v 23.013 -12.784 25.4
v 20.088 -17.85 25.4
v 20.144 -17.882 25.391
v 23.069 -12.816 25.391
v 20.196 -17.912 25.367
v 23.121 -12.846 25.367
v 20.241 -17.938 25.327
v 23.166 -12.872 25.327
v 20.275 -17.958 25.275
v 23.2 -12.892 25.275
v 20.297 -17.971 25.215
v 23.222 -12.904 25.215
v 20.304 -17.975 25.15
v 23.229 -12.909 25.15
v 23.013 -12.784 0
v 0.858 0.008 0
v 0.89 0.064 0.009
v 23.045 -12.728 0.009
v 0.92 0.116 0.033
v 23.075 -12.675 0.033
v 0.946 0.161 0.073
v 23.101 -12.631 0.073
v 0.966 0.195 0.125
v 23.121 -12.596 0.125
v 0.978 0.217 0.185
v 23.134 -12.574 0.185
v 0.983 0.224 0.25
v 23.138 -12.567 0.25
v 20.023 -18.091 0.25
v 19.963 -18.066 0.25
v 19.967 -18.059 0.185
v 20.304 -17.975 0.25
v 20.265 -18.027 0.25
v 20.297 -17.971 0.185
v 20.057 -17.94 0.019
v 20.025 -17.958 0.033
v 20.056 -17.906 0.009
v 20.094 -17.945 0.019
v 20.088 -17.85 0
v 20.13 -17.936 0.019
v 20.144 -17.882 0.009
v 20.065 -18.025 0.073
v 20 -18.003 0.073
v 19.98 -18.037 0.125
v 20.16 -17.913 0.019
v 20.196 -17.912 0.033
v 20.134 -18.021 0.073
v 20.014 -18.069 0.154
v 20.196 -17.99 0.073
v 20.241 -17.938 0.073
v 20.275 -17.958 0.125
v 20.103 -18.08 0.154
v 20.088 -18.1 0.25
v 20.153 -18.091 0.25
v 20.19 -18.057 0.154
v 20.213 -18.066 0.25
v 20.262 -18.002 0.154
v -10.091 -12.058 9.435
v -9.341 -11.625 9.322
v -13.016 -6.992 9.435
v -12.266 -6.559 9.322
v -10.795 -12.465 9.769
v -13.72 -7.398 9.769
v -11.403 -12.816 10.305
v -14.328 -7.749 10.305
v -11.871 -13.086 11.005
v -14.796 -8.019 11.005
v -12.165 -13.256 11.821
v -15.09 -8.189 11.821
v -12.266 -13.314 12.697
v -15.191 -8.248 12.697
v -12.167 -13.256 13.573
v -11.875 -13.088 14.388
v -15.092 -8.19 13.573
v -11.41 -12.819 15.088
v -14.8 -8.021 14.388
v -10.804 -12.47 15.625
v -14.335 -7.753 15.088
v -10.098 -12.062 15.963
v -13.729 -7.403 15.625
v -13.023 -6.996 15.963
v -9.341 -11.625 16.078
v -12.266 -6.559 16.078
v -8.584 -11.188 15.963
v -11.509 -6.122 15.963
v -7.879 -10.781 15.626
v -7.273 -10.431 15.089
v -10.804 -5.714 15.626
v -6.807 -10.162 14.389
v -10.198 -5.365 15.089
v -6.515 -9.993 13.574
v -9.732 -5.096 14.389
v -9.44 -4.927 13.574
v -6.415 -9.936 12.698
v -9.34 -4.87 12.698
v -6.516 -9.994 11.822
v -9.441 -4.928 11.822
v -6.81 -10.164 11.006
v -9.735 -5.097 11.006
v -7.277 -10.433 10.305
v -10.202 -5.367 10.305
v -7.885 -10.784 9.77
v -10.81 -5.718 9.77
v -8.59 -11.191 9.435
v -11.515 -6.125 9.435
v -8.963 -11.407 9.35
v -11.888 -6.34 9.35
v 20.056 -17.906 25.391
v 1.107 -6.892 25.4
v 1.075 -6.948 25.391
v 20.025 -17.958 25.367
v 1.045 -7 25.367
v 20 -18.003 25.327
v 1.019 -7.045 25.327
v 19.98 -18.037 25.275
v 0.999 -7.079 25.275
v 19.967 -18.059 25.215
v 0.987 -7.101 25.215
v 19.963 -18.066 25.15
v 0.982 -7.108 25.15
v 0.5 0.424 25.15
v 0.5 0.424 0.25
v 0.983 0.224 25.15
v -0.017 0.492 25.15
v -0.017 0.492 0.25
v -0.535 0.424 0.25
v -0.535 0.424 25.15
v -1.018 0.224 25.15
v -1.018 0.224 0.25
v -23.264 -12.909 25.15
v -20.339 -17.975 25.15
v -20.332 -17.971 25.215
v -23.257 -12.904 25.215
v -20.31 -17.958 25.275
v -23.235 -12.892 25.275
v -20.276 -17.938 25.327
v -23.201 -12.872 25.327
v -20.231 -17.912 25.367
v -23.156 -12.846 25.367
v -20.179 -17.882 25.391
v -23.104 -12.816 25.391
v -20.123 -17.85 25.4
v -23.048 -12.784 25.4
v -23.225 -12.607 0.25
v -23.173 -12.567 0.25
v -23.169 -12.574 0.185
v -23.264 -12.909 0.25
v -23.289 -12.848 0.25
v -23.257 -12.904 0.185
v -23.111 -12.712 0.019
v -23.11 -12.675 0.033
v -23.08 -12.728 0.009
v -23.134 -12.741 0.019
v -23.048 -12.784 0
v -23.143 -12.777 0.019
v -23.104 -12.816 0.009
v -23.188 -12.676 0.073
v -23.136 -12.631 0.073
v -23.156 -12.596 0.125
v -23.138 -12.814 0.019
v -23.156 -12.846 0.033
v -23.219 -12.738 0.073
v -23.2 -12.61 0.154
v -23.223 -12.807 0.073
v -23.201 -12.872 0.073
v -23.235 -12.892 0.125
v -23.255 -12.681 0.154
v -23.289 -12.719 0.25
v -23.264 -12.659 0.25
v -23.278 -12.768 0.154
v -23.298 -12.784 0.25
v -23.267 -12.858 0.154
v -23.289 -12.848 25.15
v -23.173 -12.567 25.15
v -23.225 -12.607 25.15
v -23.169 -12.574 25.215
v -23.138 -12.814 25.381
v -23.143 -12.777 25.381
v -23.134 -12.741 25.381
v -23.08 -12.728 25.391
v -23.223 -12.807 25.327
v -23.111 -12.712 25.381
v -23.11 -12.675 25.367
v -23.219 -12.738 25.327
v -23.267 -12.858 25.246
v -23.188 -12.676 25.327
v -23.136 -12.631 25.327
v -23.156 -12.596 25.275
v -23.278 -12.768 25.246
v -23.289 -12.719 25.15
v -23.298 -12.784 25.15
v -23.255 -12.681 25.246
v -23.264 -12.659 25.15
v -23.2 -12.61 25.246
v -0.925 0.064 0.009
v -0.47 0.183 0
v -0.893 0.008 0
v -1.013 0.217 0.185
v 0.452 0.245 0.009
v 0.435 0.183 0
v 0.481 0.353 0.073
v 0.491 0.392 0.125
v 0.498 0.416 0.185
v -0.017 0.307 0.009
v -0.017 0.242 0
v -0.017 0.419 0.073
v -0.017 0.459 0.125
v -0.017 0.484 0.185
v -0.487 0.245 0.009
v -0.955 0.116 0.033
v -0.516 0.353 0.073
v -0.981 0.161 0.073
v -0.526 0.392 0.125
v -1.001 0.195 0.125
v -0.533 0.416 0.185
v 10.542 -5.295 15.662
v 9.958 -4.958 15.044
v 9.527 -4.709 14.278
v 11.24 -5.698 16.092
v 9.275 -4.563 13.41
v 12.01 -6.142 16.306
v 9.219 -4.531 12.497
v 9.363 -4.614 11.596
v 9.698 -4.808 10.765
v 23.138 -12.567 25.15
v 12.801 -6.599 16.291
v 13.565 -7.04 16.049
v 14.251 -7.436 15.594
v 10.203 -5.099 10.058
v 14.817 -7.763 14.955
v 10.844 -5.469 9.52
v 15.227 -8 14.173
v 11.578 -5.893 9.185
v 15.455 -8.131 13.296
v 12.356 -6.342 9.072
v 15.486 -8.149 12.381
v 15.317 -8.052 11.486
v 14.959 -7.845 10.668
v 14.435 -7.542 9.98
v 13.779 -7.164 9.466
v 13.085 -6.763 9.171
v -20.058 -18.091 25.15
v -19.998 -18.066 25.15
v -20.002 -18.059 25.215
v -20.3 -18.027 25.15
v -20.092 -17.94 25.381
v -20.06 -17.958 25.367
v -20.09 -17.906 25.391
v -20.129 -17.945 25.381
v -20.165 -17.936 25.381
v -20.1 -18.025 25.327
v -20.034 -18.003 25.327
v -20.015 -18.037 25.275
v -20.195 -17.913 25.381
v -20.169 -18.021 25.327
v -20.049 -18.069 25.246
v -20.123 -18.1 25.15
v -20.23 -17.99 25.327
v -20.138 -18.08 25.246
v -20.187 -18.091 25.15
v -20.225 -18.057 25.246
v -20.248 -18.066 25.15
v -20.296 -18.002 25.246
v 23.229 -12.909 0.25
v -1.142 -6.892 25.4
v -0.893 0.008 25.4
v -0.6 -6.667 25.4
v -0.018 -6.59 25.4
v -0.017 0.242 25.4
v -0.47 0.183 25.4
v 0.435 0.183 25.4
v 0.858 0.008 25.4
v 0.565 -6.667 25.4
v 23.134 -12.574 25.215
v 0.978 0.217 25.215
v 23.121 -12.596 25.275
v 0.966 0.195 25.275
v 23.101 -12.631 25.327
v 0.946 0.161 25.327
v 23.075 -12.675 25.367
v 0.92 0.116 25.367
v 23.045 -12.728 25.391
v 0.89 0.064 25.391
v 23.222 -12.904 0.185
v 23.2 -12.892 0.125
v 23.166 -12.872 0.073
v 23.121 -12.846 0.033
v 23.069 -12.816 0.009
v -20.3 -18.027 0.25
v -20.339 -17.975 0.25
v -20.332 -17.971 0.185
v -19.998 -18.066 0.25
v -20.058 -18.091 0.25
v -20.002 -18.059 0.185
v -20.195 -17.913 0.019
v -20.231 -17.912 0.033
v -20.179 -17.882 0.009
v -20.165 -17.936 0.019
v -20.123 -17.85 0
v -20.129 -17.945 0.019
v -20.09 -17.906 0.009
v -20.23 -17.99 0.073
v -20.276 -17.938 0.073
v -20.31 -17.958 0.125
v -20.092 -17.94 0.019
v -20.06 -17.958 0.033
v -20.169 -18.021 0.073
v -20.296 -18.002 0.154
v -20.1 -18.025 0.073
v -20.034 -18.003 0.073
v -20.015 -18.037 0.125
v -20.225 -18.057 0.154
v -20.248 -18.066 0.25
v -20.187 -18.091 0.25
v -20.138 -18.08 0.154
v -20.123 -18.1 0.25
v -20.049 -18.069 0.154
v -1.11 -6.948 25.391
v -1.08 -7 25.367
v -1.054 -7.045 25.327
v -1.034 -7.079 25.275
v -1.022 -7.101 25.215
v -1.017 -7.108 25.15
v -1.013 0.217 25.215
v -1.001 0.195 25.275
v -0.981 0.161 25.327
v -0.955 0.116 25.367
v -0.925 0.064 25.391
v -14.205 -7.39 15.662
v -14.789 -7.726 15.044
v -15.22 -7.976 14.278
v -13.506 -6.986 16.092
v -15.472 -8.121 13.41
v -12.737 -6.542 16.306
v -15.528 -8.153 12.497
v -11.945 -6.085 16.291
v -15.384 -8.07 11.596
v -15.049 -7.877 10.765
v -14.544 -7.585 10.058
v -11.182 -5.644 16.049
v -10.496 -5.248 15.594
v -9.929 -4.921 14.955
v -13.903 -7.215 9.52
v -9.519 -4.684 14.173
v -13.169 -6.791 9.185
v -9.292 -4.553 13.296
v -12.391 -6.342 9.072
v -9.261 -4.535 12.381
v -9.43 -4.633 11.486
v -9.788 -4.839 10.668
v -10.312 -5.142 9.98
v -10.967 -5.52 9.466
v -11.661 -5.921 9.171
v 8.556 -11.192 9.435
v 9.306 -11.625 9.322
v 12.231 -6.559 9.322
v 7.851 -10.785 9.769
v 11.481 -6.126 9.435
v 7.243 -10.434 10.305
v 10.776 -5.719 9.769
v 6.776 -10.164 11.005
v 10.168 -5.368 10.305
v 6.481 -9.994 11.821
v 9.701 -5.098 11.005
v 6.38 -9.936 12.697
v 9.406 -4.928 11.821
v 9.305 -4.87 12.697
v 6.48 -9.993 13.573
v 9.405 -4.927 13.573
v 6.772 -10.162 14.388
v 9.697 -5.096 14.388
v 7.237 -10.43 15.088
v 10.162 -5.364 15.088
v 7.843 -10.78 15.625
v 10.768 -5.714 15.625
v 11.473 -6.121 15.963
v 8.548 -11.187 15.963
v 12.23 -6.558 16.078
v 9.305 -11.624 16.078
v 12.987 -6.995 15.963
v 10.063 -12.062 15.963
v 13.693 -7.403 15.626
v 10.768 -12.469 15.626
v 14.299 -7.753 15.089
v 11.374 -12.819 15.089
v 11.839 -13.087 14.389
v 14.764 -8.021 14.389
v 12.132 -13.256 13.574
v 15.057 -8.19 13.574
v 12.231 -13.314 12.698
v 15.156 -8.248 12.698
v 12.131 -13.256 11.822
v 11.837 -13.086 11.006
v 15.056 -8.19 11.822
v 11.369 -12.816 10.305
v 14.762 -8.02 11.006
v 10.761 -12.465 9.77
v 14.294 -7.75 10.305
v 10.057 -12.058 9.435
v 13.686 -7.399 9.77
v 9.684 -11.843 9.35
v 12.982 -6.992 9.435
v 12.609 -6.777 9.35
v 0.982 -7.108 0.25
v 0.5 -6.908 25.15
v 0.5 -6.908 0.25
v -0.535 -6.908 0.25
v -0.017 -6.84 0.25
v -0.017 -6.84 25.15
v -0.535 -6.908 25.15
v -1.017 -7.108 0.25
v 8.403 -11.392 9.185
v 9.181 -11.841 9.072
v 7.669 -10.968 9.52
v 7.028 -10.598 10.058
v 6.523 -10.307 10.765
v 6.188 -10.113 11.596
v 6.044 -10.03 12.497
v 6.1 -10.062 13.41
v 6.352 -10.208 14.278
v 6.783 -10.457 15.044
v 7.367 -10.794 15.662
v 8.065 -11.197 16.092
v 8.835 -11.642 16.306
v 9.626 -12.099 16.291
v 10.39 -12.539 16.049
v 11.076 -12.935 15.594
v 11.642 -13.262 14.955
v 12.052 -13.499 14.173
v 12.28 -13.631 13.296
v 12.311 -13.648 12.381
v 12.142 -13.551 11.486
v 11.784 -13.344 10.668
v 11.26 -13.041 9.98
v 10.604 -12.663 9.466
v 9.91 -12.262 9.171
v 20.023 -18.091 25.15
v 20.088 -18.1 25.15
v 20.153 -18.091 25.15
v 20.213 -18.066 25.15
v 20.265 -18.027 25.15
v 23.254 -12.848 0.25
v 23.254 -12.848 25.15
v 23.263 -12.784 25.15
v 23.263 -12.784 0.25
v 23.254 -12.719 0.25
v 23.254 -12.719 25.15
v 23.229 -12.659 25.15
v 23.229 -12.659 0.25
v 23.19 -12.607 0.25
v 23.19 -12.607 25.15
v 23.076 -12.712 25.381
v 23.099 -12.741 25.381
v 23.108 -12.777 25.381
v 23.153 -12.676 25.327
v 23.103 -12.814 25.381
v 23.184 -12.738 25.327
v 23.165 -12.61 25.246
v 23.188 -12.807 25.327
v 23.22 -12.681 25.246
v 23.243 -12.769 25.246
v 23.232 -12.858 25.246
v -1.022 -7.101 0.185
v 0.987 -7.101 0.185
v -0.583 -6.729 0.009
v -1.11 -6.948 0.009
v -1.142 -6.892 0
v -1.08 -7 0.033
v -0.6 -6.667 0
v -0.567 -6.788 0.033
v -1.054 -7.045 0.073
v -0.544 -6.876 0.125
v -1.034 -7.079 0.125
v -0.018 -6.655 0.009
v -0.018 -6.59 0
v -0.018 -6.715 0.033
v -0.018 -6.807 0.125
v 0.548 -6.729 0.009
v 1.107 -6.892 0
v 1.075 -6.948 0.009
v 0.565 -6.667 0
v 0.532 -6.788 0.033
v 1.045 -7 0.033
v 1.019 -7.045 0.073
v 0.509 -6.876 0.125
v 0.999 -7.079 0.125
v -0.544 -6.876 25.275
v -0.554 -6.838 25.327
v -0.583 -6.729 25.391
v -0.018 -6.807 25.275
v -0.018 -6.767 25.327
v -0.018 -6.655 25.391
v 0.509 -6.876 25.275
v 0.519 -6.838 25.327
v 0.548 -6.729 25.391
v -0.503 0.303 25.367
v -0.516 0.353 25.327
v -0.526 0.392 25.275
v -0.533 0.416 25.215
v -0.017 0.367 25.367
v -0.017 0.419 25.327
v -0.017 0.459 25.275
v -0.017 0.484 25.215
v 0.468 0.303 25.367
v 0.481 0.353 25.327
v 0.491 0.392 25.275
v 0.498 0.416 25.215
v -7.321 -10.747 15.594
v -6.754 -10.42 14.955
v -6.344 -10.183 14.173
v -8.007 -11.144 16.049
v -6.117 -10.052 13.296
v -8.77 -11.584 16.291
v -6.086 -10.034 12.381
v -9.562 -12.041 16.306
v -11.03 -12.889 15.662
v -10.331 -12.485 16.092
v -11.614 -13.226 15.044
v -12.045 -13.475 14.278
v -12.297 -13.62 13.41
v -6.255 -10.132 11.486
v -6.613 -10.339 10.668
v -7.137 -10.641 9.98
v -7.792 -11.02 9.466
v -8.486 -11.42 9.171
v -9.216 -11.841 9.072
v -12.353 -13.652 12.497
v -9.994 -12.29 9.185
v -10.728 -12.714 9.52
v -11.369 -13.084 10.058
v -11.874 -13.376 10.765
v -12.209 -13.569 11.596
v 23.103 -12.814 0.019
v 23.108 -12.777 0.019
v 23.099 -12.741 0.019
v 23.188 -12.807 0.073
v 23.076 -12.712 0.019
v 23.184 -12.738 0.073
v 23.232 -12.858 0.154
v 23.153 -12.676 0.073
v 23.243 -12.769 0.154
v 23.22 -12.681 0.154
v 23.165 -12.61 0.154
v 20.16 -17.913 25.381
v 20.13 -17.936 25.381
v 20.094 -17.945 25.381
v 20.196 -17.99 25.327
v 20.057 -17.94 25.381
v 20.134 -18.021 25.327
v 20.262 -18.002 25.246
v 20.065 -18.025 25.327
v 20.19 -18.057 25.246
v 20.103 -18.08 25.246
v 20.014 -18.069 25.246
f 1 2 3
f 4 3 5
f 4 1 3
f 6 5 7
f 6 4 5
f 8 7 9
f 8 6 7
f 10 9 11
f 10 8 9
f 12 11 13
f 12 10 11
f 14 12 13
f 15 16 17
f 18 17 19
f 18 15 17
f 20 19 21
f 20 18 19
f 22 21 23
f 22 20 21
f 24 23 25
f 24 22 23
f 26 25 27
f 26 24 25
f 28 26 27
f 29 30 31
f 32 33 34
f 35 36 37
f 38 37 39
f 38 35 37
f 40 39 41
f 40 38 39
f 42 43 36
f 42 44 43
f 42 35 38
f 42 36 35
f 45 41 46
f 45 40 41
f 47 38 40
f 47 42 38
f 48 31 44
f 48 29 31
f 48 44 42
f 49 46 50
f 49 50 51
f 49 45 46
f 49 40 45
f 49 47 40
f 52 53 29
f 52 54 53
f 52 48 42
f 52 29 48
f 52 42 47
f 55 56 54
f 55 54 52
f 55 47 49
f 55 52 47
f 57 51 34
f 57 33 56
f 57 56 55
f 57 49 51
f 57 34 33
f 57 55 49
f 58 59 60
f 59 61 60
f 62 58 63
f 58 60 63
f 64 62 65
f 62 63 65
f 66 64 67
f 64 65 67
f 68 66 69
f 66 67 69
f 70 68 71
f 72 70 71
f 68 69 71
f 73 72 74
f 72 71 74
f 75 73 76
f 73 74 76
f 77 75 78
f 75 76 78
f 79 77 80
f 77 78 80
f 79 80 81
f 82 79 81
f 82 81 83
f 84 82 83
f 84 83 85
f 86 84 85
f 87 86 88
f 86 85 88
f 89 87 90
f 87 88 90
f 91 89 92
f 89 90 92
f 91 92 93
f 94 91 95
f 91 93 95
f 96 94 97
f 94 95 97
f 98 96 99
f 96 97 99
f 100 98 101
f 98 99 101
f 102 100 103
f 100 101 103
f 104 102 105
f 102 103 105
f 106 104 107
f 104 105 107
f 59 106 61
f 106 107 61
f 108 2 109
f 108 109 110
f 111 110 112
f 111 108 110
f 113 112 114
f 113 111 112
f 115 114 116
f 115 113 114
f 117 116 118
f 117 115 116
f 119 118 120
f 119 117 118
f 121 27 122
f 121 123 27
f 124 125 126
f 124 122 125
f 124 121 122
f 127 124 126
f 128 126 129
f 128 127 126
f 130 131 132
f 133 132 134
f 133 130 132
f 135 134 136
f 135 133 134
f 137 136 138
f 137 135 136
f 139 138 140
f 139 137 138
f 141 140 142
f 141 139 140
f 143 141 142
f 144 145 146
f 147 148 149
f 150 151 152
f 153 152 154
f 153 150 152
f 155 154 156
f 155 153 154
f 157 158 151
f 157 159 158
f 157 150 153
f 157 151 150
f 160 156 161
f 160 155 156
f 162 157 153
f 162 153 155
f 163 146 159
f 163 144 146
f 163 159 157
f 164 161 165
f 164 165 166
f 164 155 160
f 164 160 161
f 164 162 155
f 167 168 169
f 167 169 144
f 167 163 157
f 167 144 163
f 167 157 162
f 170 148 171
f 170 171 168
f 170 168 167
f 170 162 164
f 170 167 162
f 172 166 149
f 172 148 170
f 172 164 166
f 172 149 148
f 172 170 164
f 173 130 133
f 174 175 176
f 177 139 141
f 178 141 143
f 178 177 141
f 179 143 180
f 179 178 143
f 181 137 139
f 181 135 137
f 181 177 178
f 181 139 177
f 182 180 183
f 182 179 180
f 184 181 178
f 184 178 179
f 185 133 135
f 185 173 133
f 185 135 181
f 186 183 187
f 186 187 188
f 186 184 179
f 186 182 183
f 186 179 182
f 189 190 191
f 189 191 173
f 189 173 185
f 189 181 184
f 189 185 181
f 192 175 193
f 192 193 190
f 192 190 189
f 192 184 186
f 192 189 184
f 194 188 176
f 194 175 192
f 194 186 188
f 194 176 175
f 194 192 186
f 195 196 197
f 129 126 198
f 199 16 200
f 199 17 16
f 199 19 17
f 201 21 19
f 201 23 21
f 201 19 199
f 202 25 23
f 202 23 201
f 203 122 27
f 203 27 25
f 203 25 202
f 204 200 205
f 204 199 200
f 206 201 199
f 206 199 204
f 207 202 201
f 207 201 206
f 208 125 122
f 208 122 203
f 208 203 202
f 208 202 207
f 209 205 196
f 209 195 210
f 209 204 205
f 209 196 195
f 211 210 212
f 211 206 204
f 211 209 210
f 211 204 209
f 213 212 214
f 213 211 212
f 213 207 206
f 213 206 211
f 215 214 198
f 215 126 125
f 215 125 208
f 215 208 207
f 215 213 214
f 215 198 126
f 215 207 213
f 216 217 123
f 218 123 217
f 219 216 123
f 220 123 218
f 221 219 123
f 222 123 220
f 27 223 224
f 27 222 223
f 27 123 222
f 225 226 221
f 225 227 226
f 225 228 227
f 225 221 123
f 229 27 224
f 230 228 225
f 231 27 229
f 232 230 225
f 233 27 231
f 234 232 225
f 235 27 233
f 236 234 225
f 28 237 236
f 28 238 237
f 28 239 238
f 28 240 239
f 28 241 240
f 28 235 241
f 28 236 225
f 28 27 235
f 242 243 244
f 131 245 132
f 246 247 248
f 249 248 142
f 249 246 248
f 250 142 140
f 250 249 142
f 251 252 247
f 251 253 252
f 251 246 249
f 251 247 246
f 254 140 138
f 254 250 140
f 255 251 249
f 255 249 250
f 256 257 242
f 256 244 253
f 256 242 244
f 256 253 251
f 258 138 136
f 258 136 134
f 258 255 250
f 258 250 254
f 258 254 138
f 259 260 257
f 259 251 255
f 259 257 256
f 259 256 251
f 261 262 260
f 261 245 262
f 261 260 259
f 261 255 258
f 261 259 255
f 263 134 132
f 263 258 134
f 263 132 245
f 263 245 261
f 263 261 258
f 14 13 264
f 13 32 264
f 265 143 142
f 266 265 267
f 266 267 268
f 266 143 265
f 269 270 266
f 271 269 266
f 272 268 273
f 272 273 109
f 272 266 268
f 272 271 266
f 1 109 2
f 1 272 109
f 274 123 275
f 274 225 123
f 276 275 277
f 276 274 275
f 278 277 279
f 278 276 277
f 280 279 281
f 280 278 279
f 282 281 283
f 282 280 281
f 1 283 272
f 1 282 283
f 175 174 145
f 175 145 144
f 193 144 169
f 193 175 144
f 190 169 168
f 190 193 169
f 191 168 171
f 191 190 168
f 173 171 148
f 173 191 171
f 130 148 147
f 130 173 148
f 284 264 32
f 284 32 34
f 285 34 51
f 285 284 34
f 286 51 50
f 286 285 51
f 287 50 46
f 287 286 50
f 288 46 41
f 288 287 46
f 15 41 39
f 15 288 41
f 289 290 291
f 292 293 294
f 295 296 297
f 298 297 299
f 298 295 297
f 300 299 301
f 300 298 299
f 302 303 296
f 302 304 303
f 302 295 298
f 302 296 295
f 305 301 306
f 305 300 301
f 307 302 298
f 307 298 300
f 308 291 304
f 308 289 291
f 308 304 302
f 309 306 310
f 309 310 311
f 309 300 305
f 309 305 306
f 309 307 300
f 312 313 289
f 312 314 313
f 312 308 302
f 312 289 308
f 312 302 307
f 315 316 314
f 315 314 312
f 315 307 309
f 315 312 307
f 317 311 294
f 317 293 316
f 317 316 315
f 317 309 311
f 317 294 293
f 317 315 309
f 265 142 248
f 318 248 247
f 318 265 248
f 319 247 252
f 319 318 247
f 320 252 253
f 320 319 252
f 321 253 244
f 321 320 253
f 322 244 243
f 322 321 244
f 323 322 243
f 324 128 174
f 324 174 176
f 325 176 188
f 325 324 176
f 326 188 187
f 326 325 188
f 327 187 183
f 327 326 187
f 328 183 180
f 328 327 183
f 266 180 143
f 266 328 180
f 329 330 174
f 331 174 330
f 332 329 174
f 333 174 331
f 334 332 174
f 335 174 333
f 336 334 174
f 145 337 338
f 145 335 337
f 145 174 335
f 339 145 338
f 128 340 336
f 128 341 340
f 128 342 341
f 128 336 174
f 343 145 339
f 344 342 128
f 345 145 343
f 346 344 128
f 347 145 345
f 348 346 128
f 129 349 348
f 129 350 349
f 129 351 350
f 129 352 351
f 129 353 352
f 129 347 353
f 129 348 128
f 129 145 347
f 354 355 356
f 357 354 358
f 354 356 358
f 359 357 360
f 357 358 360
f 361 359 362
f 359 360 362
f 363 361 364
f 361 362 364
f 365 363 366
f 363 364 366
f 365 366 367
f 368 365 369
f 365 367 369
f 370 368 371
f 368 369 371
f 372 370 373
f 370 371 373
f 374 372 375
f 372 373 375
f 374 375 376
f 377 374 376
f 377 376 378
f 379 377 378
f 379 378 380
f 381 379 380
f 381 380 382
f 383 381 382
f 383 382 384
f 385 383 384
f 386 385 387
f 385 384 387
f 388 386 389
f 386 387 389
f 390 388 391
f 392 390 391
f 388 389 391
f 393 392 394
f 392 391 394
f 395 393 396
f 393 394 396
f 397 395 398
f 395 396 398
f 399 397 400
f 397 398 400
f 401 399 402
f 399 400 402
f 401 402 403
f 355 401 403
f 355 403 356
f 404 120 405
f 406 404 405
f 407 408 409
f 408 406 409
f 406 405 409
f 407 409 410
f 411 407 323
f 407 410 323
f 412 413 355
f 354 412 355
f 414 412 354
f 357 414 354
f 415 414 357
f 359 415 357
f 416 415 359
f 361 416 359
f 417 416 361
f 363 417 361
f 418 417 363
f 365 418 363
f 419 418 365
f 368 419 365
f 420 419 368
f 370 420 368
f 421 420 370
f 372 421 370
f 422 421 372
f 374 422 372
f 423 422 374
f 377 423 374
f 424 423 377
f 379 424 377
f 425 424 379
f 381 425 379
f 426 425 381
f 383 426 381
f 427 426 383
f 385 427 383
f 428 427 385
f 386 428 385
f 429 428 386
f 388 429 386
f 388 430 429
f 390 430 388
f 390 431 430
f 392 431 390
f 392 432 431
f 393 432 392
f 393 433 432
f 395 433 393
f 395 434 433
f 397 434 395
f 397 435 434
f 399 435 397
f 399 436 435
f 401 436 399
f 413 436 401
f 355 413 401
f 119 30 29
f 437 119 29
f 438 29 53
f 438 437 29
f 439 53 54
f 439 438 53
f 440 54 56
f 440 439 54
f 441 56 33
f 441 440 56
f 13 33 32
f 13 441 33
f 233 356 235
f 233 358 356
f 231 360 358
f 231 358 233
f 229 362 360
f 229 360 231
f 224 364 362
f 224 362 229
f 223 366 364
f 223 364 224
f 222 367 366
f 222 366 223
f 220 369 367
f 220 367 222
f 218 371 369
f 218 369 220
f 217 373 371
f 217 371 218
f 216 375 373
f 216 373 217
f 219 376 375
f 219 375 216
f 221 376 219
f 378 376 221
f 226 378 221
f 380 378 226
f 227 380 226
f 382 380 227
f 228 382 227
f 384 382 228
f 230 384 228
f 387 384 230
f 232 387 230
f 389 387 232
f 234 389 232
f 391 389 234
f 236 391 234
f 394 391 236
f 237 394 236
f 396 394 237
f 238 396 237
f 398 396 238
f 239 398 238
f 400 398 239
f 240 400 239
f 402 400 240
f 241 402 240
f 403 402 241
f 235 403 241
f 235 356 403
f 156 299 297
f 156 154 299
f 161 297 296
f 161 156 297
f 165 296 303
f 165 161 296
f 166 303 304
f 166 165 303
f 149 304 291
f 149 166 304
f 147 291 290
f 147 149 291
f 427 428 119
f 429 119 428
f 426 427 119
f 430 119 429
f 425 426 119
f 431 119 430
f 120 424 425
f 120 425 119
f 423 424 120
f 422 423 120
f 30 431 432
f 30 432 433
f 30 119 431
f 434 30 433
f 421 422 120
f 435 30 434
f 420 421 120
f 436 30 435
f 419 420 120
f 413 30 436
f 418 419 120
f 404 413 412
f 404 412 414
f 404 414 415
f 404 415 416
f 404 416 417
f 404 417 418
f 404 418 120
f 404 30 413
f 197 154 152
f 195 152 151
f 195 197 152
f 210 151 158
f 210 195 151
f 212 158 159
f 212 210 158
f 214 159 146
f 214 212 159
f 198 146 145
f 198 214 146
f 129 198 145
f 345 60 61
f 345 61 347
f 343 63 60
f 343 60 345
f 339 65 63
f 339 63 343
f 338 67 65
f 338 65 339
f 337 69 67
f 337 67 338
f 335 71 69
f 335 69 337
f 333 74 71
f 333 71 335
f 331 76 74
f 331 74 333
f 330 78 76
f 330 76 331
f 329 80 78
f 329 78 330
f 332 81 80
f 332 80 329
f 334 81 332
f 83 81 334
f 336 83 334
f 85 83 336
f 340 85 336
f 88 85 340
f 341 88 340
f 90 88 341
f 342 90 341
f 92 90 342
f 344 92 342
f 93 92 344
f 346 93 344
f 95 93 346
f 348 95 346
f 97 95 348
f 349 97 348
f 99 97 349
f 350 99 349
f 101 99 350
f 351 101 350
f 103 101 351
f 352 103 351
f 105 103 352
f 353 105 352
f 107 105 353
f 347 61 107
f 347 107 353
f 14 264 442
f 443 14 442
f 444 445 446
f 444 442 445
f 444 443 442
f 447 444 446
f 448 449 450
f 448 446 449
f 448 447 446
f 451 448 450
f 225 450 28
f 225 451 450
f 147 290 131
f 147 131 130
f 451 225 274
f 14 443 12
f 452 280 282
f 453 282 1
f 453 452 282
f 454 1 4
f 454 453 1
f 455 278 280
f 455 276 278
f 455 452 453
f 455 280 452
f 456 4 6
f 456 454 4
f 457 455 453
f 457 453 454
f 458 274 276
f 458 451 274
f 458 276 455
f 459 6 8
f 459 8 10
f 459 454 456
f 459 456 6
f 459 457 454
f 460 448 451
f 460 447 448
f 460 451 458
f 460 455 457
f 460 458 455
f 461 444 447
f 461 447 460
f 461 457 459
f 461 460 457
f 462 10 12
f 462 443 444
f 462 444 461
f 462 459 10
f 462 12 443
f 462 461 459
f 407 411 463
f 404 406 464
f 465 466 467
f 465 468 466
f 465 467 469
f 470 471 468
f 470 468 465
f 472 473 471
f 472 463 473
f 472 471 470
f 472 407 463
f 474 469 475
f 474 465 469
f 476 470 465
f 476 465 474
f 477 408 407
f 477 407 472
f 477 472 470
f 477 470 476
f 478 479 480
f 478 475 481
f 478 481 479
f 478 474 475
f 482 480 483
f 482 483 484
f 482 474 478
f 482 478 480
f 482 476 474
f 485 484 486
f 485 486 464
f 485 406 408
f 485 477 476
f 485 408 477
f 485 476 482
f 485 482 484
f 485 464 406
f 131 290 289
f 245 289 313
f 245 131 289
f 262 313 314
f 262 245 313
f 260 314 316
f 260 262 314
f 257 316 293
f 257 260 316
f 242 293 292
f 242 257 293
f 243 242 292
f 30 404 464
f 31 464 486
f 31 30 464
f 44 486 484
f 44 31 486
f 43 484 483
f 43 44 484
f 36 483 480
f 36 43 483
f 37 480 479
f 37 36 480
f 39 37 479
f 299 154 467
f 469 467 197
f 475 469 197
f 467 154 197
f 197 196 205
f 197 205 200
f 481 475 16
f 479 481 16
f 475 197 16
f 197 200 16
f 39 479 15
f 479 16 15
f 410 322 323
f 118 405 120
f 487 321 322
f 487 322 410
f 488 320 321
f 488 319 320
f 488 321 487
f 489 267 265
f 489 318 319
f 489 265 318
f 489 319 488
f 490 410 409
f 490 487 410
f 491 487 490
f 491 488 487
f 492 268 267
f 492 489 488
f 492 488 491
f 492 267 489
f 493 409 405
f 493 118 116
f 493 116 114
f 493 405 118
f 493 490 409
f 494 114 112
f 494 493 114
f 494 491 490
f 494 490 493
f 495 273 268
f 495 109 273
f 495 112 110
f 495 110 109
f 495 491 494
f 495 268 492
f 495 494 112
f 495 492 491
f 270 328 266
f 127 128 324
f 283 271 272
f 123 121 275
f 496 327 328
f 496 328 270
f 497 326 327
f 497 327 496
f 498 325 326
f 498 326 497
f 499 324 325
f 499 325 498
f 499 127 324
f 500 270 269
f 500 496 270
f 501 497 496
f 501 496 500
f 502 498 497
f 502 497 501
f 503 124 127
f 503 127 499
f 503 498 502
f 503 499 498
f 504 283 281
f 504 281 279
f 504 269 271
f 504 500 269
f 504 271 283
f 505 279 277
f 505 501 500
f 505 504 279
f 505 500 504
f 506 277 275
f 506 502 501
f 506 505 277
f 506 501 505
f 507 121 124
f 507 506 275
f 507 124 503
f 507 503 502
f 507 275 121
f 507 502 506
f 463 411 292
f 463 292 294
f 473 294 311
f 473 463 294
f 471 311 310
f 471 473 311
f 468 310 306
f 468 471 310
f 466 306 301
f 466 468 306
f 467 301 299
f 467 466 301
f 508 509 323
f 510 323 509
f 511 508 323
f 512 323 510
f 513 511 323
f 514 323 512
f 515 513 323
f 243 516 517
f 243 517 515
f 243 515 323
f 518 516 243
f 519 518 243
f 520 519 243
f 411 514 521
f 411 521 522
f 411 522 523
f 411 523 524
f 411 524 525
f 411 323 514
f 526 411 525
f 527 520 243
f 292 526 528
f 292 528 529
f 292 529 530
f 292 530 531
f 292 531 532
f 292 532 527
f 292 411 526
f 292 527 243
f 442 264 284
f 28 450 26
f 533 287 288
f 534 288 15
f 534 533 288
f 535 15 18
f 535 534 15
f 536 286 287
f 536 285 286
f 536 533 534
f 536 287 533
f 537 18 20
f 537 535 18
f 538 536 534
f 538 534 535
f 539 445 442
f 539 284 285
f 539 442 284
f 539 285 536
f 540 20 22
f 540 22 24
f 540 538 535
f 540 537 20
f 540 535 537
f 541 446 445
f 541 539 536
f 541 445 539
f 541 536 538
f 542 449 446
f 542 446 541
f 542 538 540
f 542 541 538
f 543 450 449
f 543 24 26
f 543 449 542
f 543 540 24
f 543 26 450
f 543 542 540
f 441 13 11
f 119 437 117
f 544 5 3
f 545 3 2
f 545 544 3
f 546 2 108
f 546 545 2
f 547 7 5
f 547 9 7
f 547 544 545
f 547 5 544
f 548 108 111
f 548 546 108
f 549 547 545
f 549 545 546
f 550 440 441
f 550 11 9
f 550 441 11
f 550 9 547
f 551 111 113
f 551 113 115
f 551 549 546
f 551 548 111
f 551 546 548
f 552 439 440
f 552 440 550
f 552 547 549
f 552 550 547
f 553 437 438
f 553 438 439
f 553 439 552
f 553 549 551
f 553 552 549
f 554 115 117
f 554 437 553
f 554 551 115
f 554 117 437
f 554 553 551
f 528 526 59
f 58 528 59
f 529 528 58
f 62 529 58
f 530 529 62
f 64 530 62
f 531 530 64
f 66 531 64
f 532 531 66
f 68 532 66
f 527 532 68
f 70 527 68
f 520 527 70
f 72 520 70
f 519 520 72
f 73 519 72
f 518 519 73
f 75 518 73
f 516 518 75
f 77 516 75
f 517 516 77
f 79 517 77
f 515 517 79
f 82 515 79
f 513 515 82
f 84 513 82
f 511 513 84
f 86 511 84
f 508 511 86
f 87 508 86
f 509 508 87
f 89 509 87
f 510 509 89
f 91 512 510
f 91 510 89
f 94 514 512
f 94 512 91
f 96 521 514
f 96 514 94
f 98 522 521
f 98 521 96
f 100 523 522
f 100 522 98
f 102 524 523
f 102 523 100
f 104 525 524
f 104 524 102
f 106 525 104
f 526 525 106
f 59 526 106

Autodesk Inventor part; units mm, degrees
ref_plane "YZ Plane" through (0, 0, 0) normal (1, 0, 0) x (0, 1, 0)
ref_plane "XZ Plane" through (0, 0, 0) normal (0, 1, 0) x (-1, 0, 0)
ref_plane "XY Plane" through (0, 0, 0) normal (0, 0, 1) x (1, 0, 0)
sketch "Sketch1" plane through (0, 0, 0) normal (0, 0, 1) x (1, 0, 0)
  line L0 (-0.0175, -6.5307) -> (-20.2143, -18.1913)
  line L1 (-23.3893, -12.6921) -> (-0.0175, 0.8017)
  line L2 (-0.0175, 0.8017) -> (23.3544, -12.6921)
  line L3 (20.1794, -18.1913) -> (-0.0175, -6.5307)
  line L4 (-0.0175, 0.8017) -> (-0.0175, -6.5307) construction
  line L5 (-20.2143, -18.1913) -> (-23.3893, -12.6921)
  line L6 (20.1794, -18.1913) -> (23.3544, -12.6921)
  dimension "d4" = 120
  dimension "d5" = 6.35
  dimension "d6" = 26.9875
extrude "Extrusion1" add sketch "Sketch1" along normal blind 25.4
hole "Hole1" at (9.1809, -11.8413, 12.7) direction (0.5, 0.8660254, 0) diameter 6.756 end through all clearance for "Flat Head Machine Screw (82)" size "1/4" standard "Ansi Unified Screw Threads"
hole "Hole2" at (-9.2158, -11.8413, 12.7) direction (-0.5, 0.8660254, 0) diameter 6.756 end through all clearance for "Flat Head Machine Screw (82)" size "1/4" standard "Ansi Unified Screw Threads"
fillet "Fillet1" radius 2 2 edges at (-0.0175, -6.5307, 12.7) (-0.0175, 0.8017, 12.7)
fillet "Fillet2" radius 0.25 20 edges at (-23.3893, -12.6921, 12.7) (-20.2143, -18.1913, 12.7) (20.1794, -18.1913, 12.7) (23.3544, -12.6921, 12.7) (-0.0175, 0.4923, 25.4) (-12.2034, -6.2339, 25.4) (12.1685, -6.2339, 25.4) (-0.0175, -6.8401, 25.4) (-10.6159, -12.6497, 25.4) (10.581, -12.6497, 25.4) (-21.8018, -15.4417, 25.4) (21.7669, -15.4417, 25.4) (-21.8018, -15.4417, 0) (-0.0175, 0.4923, 0) (12.1685, -6.2339, 0) (-12.2034, -6.2339, 0) (-0.0175, -6.8401, 0) (10.581, -12.6497, 0) (-10.6159, -12.6497, 0) (21.7669, -15.4417, 0)
chamfer "Chamfer1" distance 0.25 angle 45 4 edges at (-9.2158, -11.8413, 16.078) (9.1809, -11.8413, 16.078) (-12.3908, -6.3421, 16.078) (12.3559, -6.3421, 16.078)
properties part number "drive_frame_bracket" material "Aluminum-6061"
